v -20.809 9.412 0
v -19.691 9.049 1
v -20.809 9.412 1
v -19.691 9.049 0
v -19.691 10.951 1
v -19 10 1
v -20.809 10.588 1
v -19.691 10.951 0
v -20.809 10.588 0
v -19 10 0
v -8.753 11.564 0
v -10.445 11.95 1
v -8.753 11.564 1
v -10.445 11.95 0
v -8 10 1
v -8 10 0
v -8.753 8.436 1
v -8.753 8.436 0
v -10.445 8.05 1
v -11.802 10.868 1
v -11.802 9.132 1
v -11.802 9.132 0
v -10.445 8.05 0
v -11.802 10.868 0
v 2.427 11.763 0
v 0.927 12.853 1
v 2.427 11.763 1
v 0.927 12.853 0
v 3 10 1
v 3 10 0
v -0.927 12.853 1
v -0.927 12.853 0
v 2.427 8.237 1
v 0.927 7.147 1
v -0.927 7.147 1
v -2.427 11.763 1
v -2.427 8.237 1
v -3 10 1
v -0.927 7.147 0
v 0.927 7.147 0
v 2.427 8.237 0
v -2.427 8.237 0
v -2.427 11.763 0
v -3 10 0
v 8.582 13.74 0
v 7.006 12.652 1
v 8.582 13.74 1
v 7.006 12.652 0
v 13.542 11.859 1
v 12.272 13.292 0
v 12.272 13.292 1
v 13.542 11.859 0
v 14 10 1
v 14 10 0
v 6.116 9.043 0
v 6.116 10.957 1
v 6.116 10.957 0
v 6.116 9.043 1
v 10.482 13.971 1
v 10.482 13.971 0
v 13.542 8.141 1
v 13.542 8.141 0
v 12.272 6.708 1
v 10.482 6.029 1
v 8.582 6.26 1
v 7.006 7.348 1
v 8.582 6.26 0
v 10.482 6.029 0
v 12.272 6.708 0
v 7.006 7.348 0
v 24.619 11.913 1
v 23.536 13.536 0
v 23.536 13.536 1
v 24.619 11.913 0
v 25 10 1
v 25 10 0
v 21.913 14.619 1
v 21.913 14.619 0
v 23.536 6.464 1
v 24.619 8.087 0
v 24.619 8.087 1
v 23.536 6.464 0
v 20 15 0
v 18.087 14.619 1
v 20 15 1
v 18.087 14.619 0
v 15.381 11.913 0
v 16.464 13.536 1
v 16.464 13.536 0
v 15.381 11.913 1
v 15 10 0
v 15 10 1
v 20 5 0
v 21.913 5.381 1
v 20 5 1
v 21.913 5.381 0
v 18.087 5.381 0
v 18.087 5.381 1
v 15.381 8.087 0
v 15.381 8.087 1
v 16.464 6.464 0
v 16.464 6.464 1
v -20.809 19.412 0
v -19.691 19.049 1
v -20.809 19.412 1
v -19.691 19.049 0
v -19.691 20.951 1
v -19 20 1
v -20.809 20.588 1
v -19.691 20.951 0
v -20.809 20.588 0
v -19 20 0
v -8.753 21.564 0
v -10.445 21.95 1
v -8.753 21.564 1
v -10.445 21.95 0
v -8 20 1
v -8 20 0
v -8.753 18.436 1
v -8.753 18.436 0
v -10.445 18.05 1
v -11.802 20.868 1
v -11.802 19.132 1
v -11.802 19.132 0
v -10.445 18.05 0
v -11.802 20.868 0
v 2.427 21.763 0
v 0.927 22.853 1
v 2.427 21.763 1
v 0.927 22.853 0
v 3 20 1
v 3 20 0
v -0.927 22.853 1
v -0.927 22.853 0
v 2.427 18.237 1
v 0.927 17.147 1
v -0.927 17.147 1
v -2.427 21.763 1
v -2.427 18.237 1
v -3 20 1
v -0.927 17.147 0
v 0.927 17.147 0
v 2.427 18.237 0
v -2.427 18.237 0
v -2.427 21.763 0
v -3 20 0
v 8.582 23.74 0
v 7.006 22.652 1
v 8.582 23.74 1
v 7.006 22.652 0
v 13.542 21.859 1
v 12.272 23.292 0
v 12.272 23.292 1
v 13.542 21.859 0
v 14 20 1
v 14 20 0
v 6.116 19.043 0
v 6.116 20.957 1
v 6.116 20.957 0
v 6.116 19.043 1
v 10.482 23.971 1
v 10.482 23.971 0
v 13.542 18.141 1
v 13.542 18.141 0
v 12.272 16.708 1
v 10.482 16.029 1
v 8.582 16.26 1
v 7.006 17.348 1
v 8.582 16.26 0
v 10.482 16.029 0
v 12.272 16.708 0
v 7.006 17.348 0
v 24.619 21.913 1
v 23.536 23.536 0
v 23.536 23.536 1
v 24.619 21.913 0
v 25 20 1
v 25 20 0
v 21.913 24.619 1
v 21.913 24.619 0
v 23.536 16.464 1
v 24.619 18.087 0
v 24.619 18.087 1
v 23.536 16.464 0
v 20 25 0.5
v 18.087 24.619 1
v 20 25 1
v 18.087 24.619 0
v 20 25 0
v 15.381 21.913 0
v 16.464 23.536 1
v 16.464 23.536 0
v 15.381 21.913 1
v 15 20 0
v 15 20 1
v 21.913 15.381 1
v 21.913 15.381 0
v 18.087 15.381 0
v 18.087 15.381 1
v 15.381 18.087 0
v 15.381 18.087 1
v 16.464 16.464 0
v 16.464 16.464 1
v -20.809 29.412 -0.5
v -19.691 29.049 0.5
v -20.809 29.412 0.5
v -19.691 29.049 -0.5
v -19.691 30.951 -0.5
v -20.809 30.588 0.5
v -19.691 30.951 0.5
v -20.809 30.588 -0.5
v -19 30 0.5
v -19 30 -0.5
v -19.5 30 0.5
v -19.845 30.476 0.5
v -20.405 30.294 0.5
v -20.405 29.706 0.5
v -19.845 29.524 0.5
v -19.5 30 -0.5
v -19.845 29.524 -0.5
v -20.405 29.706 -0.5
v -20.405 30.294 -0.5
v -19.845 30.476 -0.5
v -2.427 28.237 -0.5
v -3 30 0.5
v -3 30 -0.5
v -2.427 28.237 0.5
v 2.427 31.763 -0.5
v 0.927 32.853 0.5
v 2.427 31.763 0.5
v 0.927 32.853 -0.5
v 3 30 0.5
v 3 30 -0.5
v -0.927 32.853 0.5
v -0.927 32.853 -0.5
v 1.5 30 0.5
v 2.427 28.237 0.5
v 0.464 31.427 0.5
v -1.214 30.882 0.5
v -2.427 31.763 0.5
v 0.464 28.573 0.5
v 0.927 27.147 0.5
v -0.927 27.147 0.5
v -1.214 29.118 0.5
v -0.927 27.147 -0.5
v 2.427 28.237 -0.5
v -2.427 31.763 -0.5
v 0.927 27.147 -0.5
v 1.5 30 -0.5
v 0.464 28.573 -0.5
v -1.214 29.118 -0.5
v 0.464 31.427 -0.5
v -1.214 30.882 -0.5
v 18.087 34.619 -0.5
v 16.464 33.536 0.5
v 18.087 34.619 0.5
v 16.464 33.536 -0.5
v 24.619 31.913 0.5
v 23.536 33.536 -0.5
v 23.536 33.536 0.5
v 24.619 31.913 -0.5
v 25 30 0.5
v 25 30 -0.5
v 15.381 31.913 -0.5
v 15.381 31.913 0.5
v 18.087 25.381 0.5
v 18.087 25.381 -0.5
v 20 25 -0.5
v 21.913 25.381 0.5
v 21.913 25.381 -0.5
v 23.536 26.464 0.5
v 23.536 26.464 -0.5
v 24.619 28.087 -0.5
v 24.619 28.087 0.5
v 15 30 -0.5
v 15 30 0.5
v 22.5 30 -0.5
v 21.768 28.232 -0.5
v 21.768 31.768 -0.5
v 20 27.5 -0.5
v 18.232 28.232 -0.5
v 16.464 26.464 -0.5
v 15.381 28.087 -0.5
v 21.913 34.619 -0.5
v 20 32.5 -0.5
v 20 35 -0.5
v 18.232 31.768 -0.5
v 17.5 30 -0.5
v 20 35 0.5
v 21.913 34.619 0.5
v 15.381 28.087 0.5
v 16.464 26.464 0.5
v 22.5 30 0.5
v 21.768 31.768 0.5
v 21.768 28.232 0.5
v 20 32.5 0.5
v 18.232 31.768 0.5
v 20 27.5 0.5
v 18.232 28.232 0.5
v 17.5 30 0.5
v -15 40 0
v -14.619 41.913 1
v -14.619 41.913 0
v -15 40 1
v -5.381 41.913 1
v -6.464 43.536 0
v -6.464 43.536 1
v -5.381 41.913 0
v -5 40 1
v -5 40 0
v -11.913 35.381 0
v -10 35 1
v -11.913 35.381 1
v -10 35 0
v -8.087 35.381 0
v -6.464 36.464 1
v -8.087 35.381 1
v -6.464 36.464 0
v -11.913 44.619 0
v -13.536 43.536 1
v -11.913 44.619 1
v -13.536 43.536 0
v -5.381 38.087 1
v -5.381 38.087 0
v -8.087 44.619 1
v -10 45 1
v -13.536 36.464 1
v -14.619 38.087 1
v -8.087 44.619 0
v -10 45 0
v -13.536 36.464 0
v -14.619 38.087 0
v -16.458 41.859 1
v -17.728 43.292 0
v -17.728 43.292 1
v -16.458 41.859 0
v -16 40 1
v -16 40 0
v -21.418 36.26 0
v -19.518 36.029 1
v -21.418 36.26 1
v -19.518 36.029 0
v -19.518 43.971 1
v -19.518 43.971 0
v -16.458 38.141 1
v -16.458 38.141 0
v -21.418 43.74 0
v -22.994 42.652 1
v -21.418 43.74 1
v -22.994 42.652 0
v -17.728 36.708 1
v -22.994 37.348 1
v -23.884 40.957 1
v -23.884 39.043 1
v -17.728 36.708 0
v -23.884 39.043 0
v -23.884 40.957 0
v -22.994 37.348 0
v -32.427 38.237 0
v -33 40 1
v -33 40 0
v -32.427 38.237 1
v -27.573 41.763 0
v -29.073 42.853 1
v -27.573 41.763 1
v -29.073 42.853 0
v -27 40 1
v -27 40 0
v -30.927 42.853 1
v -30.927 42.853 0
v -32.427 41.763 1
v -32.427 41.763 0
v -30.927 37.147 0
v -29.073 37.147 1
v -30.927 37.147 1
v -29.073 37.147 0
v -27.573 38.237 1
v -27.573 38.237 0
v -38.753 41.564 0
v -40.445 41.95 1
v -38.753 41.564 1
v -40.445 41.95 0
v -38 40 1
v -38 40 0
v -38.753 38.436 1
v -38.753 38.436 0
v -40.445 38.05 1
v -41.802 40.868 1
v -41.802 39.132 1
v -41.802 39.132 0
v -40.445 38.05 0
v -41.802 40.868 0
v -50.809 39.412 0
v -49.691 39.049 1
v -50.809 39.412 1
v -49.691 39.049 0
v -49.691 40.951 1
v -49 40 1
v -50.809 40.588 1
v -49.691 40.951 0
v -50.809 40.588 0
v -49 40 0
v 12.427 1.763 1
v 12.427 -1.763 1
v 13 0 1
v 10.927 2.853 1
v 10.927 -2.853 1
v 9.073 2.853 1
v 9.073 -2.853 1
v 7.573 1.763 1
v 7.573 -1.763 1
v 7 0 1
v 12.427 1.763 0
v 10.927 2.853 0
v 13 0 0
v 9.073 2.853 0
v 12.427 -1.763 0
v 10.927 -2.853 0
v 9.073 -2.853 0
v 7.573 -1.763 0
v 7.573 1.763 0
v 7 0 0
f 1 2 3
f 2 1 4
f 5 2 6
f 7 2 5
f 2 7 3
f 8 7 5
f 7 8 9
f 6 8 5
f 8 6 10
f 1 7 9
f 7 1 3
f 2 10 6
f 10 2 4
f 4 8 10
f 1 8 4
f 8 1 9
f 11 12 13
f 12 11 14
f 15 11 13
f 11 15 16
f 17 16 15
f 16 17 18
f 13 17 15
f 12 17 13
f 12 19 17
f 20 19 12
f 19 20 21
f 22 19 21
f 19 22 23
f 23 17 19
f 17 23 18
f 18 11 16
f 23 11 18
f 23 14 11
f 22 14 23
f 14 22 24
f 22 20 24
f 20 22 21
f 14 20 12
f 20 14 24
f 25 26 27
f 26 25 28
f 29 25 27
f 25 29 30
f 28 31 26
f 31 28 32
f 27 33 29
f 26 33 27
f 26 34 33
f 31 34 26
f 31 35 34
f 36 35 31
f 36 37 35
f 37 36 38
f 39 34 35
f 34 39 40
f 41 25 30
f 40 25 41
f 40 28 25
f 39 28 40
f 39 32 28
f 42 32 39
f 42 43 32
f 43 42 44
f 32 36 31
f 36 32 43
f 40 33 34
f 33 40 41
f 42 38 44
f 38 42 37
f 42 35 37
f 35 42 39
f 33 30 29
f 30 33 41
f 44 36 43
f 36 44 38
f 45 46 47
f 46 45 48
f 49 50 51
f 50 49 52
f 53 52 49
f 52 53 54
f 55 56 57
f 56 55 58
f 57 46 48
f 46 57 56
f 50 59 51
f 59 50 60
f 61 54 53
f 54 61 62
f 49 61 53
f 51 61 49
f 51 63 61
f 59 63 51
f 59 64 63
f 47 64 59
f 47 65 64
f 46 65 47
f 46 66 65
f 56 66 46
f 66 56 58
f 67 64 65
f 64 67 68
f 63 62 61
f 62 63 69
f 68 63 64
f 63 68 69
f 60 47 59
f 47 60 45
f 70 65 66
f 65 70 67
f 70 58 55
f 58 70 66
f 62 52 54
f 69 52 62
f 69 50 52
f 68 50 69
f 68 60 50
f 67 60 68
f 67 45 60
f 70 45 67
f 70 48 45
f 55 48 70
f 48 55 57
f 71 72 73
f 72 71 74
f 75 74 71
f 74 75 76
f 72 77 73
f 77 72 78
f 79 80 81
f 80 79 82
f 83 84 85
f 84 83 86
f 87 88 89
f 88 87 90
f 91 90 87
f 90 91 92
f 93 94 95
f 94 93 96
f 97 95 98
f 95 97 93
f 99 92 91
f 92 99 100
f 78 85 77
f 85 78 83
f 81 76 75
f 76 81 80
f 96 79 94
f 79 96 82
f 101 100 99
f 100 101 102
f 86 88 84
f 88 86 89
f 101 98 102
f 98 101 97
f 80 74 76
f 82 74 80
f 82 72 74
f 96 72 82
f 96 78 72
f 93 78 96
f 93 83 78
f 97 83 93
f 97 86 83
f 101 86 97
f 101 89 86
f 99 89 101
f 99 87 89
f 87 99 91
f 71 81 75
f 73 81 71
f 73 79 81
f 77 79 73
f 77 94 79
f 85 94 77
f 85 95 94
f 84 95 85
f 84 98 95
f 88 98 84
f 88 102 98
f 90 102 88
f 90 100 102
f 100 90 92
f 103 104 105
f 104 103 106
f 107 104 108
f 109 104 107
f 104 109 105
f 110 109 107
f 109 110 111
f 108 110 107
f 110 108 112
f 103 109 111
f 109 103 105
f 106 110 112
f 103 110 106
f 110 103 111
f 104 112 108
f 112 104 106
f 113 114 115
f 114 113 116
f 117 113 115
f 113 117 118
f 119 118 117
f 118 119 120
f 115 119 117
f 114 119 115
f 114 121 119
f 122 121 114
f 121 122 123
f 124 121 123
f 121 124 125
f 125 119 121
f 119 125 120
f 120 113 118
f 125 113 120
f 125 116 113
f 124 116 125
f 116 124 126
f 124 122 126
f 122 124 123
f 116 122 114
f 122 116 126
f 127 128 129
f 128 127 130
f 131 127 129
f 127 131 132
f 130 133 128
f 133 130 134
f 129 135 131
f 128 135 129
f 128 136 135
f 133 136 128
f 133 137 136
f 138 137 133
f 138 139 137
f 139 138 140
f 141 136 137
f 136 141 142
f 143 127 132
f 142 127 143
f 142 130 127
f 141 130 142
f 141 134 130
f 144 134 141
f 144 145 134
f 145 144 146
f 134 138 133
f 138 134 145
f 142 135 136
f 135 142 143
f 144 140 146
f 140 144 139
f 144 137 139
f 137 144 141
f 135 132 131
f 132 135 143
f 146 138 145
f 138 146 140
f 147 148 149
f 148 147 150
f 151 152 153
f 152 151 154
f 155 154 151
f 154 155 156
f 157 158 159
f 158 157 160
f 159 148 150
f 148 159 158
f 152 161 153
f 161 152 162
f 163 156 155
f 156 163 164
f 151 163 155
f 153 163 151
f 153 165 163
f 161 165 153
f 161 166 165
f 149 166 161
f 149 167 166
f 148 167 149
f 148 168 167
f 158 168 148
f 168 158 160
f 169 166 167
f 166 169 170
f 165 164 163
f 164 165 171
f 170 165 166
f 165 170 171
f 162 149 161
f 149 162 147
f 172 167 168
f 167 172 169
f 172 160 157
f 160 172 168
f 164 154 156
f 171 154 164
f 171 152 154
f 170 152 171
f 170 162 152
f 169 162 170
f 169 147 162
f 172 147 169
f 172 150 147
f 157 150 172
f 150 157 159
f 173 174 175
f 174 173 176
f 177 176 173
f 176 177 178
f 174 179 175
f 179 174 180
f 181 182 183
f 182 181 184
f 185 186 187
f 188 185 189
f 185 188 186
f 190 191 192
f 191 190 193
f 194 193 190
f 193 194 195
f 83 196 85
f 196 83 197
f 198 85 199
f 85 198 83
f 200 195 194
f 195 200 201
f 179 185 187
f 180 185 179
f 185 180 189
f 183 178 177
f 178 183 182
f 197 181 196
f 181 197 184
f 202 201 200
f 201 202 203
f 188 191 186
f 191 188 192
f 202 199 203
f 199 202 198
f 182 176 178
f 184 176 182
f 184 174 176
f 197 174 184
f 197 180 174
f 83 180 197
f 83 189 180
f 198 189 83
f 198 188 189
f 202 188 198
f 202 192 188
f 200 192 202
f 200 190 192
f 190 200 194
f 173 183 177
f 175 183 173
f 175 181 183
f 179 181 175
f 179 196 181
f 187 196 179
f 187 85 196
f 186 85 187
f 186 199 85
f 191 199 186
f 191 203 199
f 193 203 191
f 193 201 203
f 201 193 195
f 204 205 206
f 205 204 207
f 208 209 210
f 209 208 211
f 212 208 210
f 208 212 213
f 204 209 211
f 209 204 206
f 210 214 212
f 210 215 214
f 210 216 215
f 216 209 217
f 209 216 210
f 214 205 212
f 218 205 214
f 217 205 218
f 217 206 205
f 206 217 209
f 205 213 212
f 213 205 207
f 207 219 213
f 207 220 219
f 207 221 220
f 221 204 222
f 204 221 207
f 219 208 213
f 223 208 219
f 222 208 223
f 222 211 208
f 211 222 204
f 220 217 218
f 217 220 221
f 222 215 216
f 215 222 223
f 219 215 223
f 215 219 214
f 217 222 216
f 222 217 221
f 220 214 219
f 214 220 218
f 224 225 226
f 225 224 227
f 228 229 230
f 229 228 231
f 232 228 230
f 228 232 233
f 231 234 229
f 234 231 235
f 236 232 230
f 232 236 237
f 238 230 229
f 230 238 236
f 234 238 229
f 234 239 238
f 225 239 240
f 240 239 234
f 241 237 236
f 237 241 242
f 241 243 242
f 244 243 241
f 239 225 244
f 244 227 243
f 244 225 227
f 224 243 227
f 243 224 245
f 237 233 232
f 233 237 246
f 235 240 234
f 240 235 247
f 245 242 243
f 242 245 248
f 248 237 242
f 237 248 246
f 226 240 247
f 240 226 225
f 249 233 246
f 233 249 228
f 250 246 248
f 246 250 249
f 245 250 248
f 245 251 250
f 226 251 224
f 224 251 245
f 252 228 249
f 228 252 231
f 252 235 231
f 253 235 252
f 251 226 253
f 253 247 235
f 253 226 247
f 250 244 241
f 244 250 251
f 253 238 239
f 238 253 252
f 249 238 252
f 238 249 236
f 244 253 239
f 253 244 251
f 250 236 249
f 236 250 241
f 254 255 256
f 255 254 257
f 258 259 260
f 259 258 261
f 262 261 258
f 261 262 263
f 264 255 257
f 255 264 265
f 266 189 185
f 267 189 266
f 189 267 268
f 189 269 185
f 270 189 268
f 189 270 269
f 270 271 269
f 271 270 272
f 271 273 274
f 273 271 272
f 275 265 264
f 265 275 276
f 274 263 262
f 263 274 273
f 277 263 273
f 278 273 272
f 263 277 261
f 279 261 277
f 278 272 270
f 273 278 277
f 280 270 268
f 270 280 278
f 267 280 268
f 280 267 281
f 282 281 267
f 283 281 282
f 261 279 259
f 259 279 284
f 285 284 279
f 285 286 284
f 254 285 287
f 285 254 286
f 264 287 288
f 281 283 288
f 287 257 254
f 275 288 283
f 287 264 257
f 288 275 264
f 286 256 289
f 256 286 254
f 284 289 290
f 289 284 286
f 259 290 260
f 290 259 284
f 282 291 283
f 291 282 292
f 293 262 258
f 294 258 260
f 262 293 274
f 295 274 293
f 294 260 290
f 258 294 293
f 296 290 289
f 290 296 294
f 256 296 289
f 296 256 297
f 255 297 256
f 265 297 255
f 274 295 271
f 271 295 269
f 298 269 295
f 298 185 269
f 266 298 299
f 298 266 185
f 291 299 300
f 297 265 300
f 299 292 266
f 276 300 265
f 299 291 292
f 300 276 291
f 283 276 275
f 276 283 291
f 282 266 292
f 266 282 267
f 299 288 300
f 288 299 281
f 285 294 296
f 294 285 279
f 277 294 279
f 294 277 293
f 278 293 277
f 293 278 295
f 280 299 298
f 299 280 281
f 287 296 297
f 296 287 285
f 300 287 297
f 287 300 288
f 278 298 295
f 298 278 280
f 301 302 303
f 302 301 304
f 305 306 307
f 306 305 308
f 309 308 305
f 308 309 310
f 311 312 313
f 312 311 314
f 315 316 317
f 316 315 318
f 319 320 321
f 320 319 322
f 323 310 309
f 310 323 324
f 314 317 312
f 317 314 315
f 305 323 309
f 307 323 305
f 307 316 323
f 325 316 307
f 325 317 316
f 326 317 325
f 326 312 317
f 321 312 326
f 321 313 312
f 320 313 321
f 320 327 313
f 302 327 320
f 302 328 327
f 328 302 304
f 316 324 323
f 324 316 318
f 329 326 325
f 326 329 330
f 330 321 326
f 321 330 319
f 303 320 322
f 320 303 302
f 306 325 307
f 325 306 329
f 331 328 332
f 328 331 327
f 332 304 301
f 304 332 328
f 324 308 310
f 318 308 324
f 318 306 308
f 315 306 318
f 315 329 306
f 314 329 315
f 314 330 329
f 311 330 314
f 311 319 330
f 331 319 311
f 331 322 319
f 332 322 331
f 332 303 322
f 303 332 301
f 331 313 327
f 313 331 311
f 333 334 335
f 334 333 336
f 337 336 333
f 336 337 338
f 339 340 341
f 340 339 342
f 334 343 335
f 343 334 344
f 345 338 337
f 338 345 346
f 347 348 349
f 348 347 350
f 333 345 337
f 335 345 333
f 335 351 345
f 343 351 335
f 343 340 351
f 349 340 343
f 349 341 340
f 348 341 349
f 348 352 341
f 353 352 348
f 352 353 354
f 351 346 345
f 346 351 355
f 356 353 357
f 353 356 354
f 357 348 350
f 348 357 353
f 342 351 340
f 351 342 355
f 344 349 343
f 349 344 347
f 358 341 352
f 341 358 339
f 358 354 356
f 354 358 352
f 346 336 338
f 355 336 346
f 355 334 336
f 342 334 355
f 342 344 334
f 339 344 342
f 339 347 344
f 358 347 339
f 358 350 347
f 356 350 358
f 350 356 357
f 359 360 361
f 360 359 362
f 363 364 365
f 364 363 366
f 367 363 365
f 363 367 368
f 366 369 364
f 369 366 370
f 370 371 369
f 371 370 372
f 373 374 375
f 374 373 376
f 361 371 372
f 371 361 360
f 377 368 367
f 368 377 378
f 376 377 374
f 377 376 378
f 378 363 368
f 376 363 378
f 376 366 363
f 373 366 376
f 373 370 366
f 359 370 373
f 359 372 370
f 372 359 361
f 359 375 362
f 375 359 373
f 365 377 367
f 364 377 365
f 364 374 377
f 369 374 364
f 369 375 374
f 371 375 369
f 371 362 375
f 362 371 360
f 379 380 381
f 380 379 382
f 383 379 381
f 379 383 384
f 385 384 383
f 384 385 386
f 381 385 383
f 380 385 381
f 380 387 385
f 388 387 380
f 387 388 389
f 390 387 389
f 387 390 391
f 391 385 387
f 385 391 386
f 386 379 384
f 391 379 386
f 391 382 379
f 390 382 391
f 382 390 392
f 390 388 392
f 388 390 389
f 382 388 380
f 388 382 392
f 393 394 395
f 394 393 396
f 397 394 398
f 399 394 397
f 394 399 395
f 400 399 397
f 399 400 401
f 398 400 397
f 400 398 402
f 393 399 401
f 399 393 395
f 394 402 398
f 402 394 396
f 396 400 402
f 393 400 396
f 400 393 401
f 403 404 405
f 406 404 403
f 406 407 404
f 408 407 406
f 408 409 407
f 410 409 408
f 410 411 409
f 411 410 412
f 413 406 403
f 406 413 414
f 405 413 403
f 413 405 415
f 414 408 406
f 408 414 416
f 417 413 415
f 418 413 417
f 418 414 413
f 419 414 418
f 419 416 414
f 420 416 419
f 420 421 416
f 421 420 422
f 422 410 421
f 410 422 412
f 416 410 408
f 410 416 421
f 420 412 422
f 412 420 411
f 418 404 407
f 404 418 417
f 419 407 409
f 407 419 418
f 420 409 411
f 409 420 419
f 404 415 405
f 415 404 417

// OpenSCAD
for() cylinder(r=4);
translate([10,0,0]) for(i=3) cylinder(r=i);
for(r=[1:5]) translate([r*10-30,10,0]) cylinder(r=r);
for(r=[5:1]) translate([r*10-30,20,0]) cylinder(r=r);
for(r=[1:2:6]) translate([r*10-30,30,0]) difference() {cylinder(r=r, center=true); cylinder(r=r/2, h=2, center=true);}

// Negative range, negative step
for(r=[5:-1:1]) translate([r*10-60,40,0]) cylinder(r=r);
// Negative range, positive step
for(r=[5:1:1]) translate([r*10-30,40,0]) cylinder(r=r);
// Zero step
for(r=[1:0:5]) translate([r*10+60,40,0]) cylinder(r=r);
// Negative step
for(r=[1:-1:5]) translate([r*10-30,50,0]) cylinder(r=r);
// Illegal step value
for(r=[1:true:5]) translate([r*10-60,50,0]) cylinder(r=r);

// FIXME: Nested for
